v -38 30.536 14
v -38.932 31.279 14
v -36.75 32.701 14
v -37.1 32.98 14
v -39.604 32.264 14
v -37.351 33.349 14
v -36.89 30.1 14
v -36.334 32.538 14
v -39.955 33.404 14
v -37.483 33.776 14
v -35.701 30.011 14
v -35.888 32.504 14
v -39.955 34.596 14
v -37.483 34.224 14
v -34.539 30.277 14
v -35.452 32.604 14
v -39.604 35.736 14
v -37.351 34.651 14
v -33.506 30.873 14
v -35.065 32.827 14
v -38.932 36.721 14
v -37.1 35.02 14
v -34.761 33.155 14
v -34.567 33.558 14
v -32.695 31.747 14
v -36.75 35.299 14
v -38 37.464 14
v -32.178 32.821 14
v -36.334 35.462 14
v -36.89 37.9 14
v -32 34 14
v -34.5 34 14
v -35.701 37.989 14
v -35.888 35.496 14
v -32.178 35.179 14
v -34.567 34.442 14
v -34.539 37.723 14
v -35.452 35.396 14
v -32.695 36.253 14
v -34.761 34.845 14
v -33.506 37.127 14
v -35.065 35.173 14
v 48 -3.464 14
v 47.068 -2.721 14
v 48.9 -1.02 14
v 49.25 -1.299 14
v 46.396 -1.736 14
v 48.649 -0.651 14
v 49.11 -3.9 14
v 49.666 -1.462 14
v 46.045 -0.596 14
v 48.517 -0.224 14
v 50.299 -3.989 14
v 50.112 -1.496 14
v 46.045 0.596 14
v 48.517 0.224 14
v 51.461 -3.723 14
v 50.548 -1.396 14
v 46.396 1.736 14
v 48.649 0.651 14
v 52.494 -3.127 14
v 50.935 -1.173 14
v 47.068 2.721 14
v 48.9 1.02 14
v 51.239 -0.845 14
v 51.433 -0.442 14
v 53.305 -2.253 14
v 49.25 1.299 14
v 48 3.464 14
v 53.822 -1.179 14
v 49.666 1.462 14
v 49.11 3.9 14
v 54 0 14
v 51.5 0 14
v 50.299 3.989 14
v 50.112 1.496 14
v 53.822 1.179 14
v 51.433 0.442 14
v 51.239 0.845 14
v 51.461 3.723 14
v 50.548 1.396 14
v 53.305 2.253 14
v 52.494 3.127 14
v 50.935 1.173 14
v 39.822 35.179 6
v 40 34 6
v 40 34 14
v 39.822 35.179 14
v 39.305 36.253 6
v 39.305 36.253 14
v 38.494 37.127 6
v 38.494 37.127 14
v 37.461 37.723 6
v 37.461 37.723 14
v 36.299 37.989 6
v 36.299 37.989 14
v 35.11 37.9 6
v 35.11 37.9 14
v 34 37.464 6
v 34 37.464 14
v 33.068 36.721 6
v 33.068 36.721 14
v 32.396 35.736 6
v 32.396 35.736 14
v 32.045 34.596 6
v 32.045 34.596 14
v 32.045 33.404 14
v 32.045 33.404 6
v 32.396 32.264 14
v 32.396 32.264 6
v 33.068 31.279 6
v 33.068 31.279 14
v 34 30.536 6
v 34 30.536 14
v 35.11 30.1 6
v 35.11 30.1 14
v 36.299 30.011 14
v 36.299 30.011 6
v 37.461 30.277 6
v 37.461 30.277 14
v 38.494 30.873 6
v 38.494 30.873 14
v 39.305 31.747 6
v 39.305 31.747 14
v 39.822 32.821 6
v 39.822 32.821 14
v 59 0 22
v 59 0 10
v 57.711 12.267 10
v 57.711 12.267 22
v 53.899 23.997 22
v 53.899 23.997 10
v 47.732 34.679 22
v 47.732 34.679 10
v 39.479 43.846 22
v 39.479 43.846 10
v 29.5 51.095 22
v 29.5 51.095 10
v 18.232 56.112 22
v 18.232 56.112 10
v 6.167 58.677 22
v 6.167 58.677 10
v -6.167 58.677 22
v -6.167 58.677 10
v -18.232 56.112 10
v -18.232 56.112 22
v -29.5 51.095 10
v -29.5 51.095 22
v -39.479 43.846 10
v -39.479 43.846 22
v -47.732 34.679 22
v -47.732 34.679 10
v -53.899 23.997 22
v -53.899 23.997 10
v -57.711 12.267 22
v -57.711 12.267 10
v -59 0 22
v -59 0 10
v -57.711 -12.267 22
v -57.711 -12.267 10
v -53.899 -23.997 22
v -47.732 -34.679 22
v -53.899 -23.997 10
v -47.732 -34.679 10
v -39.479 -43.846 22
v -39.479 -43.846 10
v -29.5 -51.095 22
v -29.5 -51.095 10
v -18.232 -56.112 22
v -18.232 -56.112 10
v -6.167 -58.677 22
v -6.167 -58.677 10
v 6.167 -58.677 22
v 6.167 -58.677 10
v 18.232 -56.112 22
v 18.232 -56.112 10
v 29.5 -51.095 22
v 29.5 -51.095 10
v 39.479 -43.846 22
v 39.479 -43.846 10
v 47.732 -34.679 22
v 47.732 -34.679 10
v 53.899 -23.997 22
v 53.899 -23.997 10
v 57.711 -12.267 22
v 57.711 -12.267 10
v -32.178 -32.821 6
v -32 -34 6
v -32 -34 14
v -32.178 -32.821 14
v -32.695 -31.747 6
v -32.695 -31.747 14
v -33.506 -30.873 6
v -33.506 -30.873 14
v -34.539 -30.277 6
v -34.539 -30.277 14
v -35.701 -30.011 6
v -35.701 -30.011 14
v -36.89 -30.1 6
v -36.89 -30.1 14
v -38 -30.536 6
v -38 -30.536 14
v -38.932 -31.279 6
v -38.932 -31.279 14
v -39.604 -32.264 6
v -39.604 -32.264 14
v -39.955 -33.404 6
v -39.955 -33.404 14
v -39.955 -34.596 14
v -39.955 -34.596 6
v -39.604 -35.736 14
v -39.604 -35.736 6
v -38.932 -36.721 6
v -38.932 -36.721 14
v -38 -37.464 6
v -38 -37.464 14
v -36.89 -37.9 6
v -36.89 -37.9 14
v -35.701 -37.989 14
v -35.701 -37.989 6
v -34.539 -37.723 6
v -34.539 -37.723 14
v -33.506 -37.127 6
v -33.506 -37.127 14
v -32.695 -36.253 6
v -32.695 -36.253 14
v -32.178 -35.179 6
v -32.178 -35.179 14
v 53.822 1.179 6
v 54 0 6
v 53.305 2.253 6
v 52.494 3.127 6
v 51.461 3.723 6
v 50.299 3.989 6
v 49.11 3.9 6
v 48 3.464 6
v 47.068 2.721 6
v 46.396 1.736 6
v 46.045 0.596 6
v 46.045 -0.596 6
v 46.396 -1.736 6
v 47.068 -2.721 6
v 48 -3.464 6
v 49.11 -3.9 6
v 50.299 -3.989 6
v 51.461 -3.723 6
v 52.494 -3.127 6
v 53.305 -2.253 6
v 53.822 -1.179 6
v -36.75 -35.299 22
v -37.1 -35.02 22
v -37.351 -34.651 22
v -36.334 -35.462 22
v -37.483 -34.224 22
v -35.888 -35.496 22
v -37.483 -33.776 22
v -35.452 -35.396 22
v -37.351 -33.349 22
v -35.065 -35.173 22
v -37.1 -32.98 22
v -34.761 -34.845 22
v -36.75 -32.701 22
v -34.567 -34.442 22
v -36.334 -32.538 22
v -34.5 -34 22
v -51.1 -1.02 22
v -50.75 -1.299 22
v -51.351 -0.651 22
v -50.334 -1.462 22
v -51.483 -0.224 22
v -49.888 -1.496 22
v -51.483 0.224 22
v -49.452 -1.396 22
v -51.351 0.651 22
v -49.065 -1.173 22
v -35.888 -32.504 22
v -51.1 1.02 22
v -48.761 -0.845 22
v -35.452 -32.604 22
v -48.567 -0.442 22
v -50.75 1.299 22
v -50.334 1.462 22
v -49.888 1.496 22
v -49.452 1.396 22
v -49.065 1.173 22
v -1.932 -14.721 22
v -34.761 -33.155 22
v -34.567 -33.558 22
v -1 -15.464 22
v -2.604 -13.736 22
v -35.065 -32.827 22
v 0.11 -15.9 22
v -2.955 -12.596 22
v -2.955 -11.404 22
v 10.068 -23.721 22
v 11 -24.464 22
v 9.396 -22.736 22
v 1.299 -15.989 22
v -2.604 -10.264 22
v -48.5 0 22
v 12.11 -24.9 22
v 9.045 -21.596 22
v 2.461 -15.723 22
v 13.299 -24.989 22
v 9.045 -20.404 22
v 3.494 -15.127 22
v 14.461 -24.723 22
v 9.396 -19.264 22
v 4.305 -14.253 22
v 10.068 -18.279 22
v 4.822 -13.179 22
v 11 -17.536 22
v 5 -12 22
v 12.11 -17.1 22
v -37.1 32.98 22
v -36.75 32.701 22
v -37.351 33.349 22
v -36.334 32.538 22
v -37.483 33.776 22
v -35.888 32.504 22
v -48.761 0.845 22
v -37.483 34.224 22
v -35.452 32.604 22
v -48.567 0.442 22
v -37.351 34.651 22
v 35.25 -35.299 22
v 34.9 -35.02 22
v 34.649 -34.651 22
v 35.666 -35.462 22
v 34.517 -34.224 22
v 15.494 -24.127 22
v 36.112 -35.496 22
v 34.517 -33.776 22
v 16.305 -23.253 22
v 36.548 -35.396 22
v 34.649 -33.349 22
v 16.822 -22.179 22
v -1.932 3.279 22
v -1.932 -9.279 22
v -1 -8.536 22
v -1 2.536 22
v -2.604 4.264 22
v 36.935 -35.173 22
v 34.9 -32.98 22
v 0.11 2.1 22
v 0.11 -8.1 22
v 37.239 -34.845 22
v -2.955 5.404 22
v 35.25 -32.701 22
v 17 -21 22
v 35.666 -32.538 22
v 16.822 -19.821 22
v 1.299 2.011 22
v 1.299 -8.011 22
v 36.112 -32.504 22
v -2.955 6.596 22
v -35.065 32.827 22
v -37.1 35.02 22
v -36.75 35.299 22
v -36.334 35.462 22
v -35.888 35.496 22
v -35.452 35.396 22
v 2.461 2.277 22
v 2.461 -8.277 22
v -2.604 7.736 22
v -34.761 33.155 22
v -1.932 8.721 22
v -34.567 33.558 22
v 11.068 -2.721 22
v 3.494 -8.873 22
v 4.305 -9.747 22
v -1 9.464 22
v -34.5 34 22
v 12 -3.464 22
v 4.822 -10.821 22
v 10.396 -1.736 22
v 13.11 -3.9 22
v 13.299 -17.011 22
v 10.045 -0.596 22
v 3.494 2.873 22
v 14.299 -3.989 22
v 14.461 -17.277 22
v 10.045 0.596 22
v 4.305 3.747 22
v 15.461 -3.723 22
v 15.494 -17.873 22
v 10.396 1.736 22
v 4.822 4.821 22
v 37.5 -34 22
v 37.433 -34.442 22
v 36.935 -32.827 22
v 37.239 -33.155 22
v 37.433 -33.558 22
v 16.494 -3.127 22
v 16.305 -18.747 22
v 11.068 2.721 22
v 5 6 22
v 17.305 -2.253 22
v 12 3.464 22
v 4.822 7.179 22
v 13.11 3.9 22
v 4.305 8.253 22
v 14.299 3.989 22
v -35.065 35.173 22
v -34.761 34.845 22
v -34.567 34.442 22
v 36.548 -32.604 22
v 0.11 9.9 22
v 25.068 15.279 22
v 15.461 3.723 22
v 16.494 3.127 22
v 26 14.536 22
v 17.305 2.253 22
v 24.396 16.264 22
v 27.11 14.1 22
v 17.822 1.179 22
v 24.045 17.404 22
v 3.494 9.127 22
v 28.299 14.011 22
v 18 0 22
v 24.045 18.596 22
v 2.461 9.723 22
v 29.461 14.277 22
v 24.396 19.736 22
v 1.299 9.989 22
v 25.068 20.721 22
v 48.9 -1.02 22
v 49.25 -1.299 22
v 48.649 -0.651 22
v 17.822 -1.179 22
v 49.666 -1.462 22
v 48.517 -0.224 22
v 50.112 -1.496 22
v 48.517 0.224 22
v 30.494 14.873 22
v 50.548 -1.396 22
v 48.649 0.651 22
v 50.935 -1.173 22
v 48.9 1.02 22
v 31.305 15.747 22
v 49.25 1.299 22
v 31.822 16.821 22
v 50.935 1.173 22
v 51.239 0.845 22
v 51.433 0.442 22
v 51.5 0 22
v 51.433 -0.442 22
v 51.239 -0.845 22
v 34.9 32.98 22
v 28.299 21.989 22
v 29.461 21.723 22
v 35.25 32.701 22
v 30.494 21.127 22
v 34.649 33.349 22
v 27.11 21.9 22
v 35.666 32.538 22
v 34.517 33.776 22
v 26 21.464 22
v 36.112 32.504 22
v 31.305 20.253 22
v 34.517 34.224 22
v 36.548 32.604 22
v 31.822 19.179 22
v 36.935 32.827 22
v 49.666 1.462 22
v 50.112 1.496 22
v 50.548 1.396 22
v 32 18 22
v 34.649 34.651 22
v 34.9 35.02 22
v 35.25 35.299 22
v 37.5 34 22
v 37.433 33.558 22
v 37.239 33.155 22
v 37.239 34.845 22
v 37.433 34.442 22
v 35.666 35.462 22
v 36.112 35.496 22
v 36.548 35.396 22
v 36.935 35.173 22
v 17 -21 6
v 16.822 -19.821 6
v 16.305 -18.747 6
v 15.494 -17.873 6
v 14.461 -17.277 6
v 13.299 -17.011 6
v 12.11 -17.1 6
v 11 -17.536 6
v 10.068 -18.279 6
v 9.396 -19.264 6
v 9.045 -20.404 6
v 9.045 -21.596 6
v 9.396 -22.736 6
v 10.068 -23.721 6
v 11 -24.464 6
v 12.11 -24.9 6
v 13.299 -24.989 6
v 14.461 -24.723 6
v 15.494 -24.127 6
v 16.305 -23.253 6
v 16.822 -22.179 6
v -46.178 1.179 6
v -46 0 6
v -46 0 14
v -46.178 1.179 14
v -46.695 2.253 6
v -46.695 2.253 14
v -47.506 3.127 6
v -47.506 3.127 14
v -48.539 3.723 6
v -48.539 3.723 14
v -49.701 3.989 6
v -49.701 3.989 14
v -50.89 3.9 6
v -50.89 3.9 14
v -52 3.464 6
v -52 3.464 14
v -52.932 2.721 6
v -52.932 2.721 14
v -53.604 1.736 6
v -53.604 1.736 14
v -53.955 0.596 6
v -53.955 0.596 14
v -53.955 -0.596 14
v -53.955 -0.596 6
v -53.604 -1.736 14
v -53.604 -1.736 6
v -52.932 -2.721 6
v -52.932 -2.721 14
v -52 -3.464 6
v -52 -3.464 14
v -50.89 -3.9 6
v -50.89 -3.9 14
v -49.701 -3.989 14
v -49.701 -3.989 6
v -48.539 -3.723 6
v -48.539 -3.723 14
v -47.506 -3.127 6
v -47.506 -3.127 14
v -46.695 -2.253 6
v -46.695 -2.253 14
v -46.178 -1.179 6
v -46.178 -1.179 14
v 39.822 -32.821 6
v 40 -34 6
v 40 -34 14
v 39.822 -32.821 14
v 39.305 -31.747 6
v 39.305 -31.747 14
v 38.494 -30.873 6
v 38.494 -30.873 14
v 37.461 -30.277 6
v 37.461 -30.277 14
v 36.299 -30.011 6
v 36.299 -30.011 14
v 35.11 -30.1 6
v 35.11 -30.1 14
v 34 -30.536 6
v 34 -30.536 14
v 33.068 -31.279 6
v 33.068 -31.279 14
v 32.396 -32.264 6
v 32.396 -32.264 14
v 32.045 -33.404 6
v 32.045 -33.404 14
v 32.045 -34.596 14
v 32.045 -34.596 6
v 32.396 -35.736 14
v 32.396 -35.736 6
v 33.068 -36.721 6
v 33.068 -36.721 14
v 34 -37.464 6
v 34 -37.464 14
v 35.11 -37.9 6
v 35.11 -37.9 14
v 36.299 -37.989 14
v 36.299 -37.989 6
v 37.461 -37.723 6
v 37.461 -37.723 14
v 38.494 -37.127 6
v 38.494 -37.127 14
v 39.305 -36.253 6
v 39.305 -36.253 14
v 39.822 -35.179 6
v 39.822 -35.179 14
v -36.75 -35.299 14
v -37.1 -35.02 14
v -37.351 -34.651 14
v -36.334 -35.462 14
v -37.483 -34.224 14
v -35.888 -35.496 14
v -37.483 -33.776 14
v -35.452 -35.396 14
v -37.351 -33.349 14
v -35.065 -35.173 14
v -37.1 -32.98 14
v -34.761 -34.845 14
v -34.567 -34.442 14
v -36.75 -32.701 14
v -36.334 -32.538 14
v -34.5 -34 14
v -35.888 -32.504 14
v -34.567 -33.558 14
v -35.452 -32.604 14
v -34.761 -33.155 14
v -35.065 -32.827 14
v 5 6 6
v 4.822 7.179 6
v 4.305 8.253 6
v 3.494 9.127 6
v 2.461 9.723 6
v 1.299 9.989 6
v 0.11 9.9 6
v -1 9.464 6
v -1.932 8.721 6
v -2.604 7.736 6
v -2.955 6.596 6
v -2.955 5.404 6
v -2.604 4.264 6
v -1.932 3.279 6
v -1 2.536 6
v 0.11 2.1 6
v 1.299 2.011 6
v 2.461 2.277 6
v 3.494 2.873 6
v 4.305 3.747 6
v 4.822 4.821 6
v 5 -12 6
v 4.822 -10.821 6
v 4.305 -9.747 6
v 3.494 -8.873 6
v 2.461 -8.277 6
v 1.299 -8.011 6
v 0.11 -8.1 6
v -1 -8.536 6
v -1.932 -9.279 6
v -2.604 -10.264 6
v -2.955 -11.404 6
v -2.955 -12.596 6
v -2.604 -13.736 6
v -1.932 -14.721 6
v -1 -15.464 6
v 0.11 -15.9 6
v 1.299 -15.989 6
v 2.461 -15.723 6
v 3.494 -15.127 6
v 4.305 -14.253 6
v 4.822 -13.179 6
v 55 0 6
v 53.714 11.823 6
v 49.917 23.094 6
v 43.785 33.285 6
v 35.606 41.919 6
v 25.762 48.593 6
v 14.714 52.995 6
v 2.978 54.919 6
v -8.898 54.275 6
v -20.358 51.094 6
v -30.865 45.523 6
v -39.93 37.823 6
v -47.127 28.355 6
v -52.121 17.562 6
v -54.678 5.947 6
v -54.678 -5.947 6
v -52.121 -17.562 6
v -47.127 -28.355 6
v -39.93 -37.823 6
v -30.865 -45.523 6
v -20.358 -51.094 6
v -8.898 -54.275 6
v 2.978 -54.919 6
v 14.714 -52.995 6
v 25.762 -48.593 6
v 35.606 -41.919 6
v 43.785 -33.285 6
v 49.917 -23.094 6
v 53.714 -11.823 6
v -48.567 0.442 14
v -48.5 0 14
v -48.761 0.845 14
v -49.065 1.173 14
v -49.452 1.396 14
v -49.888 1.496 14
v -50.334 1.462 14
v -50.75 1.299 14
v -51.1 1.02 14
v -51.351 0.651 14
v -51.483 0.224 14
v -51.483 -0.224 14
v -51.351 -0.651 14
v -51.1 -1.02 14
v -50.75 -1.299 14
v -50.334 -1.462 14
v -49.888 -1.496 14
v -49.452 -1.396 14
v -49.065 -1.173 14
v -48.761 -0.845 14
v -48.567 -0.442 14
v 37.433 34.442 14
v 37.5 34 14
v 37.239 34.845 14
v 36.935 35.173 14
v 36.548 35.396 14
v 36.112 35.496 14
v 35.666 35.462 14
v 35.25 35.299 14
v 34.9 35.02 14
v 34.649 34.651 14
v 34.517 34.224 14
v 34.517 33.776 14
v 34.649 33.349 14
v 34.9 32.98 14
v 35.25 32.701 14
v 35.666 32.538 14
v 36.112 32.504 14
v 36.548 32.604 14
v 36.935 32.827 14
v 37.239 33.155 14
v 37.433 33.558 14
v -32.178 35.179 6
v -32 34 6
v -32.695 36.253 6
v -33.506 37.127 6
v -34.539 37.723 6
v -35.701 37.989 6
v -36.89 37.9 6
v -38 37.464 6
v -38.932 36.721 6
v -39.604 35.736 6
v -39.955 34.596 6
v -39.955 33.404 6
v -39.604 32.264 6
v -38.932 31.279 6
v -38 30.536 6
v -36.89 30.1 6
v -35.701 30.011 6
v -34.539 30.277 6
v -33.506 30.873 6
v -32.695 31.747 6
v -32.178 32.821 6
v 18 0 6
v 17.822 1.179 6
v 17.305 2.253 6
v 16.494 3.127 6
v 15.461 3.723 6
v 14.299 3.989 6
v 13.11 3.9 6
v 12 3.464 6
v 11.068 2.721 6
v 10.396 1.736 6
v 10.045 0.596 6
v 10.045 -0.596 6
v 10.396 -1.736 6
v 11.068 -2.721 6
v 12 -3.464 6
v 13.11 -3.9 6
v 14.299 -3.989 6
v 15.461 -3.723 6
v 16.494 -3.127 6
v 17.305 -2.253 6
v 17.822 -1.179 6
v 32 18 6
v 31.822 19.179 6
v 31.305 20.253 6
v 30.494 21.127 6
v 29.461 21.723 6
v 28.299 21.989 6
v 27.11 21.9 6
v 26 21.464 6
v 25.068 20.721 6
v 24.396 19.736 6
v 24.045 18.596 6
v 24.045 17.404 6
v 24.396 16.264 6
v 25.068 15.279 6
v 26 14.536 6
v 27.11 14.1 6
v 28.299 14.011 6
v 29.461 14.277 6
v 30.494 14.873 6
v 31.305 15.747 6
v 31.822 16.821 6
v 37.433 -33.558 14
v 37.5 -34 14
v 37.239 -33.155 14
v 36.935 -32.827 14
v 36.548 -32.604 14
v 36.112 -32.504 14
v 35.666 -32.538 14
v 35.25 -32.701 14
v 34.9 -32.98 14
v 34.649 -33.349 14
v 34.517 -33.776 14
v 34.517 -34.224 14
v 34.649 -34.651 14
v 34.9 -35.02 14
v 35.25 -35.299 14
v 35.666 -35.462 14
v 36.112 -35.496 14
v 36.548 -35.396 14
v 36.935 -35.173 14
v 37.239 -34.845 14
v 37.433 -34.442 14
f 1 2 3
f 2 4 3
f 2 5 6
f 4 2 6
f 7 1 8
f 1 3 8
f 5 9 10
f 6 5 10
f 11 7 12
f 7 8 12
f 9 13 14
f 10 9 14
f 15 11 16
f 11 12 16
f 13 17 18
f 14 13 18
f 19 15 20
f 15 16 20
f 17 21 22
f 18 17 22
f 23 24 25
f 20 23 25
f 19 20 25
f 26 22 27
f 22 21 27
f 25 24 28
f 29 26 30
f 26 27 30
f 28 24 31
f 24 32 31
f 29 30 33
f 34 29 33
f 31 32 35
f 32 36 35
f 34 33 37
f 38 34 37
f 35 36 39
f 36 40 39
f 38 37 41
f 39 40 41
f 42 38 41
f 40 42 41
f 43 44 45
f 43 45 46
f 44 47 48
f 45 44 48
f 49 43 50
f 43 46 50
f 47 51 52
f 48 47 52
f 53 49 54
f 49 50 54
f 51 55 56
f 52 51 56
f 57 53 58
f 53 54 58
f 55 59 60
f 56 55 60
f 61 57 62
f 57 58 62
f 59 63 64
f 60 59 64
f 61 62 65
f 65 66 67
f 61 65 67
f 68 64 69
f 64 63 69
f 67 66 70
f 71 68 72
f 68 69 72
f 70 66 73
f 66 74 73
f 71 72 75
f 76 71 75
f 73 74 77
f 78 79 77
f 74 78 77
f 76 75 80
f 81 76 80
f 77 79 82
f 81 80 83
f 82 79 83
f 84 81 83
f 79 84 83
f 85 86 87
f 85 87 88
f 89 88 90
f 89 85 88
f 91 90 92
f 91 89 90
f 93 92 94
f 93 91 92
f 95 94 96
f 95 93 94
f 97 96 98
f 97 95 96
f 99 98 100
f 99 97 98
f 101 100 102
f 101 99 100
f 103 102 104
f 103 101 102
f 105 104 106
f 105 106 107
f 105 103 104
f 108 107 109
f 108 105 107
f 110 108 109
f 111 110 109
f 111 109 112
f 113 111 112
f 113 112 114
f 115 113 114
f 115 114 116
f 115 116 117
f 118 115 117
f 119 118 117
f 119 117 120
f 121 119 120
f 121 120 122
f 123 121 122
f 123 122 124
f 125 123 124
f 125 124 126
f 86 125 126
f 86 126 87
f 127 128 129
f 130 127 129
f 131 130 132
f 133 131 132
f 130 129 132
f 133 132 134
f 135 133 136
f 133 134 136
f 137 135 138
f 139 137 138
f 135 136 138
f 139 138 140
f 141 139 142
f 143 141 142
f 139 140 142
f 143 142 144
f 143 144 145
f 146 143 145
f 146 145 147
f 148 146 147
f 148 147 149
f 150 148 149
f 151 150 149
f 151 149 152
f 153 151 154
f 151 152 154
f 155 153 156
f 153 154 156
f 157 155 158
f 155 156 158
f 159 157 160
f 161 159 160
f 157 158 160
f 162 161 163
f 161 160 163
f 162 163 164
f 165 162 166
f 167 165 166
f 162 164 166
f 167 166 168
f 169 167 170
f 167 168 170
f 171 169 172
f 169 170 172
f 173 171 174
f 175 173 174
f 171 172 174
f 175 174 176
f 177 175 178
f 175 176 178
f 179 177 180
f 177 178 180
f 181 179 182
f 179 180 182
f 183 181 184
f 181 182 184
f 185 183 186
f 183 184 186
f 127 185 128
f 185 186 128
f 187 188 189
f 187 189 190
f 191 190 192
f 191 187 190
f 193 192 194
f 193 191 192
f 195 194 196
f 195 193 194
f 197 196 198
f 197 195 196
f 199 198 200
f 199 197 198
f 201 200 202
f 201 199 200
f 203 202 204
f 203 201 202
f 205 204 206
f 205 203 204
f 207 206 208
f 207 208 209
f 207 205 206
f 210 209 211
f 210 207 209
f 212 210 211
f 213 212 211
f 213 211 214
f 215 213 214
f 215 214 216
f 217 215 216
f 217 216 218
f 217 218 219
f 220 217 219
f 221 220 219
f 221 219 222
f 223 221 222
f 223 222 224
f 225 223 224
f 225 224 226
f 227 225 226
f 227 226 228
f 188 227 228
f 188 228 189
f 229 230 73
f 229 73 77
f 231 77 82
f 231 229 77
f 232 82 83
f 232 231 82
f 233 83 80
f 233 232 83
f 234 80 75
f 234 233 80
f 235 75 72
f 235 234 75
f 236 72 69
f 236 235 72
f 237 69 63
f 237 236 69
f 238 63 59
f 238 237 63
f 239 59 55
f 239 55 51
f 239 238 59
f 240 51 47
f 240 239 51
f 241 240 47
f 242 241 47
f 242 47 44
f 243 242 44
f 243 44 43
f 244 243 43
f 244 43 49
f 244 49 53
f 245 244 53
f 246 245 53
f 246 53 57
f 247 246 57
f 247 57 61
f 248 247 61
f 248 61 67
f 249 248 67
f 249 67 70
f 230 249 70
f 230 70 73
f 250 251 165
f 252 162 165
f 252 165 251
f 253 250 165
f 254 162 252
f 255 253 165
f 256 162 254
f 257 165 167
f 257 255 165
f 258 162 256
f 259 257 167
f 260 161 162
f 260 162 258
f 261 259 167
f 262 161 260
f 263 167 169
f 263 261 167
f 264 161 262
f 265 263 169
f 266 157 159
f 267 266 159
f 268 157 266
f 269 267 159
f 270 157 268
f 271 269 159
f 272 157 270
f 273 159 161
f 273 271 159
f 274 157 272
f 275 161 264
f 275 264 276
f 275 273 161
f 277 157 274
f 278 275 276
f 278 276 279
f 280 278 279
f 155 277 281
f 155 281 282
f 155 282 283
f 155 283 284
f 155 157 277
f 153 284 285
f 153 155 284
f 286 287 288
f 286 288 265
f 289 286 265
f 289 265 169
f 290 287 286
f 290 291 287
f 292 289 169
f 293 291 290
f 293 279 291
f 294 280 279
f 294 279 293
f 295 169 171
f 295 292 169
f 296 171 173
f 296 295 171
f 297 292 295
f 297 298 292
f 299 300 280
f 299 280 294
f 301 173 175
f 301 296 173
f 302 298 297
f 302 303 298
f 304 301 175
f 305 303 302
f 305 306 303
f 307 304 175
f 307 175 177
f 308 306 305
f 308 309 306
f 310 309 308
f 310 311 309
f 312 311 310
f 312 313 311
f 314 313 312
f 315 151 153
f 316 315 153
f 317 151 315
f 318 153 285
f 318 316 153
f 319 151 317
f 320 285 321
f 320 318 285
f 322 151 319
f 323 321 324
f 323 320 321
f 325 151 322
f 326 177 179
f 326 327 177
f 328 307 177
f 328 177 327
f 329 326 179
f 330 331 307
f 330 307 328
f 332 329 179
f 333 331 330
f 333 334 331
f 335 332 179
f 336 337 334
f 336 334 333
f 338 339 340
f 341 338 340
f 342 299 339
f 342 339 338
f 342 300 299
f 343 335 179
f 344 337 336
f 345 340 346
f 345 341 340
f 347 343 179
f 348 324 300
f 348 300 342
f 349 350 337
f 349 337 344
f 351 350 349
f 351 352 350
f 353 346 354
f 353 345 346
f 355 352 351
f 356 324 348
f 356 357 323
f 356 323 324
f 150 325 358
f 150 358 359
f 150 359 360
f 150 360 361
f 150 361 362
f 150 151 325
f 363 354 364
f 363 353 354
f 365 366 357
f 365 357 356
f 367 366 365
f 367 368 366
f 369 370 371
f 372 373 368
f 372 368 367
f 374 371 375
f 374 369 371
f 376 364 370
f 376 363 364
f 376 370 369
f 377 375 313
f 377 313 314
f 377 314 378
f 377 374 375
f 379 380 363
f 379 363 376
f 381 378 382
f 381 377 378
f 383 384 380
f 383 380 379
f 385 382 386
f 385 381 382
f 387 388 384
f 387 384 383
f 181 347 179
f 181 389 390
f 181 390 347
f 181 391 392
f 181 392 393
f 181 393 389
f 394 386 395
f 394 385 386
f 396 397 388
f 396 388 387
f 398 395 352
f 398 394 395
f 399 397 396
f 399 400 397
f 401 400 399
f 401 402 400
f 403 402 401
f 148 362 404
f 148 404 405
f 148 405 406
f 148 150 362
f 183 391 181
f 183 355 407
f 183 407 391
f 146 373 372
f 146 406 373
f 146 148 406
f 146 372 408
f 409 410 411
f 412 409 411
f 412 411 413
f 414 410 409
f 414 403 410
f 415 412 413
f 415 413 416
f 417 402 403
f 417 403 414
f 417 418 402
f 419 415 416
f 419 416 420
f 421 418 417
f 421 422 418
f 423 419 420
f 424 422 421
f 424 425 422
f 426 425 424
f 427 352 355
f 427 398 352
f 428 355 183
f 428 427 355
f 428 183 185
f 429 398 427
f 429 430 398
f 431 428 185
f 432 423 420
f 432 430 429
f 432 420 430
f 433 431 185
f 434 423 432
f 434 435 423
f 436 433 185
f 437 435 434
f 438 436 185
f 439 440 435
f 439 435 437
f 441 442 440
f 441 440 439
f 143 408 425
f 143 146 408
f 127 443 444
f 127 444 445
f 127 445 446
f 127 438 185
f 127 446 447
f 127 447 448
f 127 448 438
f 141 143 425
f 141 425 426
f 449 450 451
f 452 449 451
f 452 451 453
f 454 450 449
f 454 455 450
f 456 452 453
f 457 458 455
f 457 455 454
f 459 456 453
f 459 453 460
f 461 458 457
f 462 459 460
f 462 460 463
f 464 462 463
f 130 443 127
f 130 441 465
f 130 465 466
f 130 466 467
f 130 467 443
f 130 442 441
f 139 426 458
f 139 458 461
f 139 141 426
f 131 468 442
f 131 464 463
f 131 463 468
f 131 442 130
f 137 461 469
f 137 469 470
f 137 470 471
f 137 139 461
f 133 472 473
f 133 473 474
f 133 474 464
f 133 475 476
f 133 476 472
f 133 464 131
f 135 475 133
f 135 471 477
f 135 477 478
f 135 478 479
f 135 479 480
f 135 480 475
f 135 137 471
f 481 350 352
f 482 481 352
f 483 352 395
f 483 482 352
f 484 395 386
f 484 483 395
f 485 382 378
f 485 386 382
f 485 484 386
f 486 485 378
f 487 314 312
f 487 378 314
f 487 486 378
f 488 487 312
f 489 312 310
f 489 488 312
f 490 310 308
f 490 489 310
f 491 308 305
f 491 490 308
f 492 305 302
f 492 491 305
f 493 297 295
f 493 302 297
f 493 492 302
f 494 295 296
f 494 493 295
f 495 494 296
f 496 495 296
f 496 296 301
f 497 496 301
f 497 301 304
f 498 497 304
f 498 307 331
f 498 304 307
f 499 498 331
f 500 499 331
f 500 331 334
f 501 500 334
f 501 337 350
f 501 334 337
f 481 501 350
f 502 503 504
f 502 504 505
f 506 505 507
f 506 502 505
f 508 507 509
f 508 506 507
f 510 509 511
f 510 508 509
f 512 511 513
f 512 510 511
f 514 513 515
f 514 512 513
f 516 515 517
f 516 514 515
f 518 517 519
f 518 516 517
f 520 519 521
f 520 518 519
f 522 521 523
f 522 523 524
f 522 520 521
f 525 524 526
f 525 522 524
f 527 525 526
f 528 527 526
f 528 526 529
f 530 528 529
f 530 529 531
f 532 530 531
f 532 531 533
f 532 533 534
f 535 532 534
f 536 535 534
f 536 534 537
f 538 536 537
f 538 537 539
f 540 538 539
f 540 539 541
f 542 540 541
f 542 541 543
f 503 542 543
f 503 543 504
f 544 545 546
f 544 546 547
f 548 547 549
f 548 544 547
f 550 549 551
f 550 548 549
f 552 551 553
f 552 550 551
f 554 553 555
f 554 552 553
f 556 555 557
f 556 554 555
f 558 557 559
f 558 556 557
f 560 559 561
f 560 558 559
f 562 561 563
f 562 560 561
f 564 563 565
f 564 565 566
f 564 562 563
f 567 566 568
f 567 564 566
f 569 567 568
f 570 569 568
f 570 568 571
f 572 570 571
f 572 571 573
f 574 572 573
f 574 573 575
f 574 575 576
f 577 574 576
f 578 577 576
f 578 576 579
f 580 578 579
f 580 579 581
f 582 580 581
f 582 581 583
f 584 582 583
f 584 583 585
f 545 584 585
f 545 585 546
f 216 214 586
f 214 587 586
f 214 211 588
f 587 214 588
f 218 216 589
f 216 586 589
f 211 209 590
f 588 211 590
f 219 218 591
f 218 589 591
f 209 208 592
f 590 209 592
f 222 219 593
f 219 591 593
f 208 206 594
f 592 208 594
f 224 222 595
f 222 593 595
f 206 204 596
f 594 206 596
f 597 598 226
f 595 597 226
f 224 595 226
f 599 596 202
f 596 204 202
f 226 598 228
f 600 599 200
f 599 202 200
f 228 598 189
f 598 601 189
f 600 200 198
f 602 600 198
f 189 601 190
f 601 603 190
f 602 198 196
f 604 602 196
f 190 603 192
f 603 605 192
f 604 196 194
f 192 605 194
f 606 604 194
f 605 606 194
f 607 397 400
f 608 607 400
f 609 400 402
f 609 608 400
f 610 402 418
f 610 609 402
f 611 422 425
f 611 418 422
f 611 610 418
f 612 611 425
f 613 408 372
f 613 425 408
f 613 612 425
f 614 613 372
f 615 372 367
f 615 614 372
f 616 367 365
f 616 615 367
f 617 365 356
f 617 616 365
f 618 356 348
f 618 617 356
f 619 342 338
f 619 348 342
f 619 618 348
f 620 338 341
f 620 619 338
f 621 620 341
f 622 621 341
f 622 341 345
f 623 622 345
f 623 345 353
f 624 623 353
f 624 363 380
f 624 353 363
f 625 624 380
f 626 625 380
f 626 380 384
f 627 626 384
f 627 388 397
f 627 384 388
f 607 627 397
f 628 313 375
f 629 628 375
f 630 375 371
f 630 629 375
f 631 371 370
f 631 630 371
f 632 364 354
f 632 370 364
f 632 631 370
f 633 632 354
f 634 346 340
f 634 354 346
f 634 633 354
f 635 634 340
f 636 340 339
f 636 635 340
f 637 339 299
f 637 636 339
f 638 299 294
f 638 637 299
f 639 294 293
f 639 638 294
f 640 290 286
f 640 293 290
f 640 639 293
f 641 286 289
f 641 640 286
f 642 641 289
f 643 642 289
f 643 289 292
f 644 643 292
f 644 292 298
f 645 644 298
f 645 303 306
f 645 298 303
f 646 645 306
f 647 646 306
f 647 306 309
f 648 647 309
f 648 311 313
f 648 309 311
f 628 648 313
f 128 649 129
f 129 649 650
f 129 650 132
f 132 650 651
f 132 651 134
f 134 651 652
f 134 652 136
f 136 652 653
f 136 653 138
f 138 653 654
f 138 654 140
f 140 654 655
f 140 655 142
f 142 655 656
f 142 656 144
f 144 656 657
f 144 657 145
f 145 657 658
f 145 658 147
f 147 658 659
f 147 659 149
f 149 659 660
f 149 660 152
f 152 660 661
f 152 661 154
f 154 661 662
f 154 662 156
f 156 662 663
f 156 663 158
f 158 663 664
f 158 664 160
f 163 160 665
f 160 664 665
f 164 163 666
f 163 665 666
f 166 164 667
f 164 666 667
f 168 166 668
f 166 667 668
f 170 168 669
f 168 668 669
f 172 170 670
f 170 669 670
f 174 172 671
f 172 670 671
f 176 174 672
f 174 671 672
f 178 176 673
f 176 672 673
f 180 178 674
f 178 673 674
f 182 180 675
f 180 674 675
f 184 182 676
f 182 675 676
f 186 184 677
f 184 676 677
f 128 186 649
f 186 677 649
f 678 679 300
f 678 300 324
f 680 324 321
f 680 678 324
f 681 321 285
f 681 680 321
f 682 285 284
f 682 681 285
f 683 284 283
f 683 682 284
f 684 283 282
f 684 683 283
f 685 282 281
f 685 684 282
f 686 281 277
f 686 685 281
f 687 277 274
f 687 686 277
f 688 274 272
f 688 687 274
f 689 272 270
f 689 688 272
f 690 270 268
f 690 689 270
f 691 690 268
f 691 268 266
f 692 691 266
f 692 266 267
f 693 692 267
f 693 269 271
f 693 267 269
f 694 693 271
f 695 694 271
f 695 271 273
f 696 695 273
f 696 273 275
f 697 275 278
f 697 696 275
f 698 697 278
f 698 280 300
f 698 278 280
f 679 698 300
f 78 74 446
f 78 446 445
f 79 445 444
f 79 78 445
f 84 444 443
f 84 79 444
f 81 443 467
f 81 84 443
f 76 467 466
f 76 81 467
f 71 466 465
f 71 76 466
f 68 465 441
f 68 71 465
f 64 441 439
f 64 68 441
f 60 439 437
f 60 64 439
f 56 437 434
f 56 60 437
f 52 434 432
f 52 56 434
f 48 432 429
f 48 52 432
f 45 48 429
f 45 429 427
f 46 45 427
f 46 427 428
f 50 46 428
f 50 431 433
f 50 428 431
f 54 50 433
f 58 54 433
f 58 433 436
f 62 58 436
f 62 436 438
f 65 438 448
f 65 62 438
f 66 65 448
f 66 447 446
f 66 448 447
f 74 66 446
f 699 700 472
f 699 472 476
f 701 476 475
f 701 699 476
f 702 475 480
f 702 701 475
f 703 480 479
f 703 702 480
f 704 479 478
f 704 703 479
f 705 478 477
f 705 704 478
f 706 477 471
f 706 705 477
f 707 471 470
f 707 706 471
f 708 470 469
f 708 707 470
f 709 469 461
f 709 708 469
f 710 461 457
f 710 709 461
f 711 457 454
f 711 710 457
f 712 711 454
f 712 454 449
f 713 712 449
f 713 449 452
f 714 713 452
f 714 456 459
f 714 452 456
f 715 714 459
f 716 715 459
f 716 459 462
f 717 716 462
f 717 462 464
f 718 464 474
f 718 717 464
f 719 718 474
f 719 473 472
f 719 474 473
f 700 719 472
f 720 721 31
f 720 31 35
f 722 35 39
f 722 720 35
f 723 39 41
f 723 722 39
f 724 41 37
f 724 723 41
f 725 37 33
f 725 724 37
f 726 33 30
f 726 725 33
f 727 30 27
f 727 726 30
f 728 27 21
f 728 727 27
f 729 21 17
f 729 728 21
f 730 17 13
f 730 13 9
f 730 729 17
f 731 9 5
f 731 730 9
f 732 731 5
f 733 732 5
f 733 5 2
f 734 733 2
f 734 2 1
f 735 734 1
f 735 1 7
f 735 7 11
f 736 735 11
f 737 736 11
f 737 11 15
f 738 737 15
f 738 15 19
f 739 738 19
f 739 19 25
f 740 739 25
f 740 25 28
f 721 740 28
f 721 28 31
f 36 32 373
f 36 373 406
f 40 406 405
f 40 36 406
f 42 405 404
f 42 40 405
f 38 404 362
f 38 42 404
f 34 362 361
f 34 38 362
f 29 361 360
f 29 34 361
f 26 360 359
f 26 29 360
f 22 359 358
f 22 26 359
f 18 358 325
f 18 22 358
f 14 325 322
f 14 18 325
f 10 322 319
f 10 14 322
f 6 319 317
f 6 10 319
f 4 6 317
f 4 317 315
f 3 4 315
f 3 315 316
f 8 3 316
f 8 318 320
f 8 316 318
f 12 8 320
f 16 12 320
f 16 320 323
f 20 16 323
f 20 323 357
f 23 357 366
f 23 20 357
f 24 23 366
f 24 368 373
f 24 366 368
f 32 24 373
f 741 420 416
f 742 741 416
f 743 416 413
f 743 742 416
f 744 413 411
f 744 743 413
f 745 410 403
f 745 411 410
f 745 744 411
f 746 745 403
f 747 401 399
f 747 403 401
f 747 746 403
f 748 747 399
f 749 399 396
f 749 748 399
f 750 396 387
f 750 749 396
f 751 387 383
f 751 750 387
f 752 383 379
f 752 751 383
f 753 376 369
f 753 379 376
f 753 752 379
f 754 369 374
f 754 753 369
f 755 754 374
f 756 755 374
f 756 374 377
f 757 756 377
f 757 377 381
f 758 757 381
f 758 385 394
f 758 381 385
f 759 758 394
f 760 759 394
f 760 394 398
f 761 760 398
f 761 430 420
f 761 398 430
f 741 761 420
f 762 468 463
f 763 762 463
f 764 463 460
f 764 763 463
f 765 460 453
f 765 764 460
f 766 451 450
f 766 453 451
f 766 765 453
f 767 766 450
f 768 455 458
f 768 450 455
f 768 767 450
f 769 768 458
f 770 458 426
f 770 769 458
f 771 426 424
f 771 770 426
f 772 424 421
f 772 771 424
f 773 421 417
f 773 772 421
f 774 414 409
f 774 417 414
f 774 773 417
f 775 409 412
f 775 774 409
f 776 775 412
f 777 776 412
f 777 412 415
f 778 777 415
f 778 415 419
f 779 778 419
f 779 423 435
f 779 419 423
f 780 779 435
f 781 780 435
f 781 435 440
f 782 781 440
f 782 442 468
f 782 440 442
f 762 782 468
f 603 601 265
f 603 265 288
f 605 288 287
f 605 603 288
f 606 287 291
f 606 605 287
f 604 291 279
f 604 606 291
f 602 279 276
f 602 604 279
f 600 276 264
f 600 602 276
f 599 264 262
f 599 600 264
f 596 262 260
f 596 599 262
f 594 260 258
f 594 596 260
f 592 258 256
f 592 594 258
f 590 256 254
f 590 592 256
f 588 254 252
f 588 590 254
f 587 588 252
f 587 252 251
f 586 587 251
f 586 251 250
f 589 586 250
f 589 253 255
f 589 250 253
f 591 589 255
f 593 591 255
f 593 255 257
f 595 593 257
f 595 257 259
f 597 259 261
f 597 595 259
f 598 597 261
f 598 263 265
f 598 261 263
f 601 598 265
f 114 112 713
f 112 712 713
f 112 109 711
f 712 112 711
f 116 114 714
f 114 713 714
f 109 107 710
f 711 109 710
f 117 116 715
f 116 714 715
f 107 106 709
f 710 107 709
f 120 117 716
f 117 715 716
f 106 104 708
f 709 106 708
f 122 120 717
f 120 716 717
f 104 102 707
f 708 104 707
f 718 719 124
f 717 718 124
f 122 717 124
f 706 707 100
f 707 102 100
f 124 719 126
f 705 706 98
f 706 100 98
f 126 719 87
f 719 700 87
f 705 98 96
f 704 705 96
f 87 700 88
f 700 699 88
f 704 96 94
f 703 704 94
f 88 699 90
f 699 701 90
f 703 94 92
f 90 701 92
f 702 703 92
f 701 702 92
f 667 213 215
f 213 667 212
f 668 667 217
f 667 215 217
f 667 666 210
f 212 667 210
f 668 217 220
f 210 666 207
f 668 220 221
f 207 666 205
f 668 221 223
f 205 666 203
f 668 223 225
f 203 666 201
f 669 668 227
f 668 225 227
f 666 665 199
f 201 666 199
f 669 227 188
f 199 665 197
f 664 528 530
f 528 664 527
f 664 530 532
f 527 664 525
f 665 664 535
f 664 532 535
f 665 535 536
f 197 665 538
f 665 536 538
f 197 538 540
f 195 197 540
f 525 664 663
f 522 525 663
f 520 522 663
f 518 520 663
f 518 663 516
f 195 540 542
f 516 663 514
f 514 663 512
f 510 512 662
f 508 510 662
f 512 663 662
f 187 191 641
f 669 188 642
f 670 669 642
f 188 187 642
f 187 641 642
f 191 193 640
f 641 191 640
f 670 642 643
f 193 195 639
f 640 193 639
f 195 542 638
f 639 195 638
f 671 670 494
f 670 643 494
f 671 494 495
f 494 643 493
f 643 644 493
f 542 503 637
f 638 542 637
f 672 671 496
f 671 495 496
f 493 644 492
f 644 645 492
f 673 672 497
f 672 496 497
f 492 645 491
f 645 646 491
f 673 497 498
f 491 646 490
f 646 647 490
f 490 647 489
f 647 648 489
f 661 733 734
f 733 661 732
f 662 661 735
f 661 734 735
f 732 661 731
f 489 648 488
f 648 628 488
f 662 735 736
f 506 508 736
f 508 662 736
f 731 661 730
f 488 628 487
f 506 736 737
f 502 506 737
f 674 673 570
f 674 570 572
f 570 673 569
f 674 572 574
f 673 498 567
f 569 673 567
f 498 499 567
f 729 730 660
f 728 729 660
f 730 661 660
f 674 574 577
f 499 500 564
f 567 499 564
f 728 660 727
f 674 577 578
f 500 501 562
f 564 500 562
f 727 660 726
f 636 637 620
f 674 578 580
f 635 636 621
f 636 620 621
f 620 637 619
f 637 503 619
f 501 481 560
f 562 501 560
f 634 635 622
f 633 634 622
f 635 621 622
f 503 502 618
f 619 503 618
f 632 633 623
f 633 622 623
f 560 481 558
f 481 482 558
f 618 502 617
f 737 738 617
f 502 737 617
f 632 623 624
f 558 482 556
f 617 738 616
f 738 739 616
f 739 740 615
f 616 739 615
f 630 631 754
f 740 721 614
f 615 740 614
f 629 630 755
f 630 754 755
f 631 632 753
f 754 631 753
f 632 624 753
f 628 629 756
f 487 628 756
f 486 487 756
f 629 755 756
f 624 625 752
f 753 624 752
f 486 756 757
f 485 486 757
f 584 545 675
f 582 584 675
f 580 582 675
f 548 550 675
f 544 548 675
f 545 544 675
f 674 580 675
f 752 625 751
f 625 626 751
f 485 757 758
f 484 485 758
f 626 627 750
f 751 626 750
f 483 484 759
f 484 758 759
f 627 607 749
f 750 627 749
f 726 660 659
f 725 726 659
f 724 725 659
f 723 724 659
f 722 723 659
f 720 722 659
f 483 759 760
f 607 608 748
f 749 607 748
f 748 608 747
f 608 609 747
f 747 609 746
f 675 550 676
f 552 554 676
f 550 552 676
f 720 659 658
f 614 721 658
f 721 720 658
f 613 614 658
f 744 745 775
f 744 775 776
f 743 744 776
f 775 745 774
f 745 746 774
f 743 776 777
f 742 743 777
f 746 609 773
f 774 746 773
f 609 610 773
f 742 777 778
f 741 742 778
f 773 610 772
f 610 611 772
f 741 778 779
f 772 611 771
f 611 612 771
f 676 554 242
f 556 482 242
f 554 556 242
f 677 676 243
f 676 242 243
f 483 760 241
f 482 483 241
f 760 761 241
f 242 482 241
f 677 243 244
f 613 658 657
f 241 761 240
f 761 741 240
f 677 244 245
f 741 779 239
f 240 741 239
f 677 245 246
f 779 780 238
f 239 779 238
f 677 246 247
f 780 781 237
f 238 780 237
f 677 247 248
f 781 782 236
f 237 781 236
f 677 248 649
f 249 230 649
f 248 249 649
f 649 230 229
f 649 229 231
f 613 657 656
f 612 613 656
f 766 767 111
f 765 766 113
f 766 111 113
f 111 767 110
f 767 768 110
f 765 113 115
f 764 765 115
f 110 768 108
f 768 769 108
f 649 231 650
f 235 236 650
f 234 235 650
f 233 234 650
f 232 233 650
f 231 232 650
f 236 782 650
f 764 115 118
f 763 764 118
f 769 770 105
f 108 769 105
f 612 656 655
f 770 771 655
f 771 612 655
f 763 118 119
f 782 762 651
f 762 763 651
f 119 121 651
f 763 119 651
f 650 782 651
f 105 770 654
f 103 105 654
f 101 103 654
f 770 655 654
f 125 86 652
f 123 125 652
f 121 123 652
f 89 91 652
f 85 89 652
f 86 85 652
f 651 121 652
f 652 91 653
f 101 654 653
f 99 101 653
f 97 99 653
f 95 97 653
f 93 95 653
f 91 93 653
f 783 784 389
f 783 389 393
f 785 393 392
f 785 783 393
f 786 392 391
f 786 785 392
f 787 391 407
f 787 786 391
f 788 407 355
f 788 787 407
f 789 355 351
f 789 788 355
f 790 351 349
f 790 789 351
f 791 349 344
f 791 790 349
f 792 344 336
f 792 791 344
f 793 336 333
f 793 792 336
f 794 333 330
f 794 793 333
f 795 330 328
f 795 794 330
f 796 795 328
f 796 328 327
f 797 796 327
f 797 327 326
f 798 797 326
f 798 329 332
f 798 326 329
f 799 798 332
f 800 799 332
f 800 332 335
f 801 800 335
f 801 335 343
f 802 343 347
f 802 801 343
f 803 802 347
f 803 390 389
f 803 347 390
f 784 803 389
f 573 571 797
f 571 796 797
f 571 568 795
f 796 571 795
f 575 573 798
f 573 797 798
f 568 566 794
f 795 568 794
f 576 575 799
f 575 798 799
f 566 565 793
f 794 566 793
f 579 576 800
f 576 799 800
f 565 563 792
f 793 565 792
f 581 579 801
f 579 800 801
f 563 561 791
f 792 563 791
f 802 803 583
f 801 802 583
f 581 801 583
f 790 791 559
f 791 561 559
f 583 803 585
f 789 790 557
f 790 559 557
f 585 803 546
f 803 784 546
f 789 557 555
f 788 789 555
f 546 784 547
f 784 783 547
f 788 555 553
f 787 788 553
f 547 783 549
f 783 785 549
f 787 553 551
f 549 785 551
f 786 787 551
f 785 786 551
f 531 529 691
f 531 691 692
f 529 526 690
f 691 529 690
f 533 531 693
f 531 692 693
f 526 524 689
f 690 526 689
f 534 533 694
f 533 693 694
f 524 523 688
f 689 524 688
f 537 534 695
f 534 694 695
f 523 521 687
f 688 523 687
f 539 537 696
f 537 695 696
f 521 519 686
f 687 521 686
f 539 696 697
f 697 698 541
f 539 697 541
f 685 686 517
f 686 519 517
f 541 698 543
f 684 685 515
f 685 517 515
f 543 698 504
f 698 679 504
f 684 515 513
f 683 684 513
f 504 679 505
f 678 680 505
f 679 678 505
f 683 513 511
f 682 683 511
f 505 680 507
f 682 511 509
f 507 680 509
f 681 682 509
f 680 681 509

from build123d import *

# Parameters (mm, degrees)
CYLINDER1536_R     = 4
CYLINDER1536_DEPTH = 100
CYLINDER1535_R     = 4
CYLINDER1535_DEPTH = 100
CYLINDER1484_R     = 1.5
CYLINDER1484_DEPTH = 100
CYLINDER1485_R     = 1.5
CYLINDER1485_DEPTH = 100
CYLINDER1486_R     = 1.5
CYLINDER1486_DEPTH = 100
CYLINDER1487_R     = 1.5
CYLINDER1487_DEPTH = 100
CYLINDER1488_R     = 1.5
CYLINDER1488_DEPTH = 100
CYLINDER1483_R     = 1.5
CYLINDER1483_DEPTH = 100
CYLINDER1133_R     = 4
CYLINDER1133_DEPTH = 100
CYLINDER1134_R     = 4
CYLINDER1134_DEPTH = 100
CYLINDER1135_R     = 4
CYLINDER1135_DEPTH = 100
CYLINDER1131_R     = 4
CYLINDER1131_DEPTH = 100
CYLINDER1136_R     = 4
CYLINDER1136_DEPTH = 100
CYLINDER1132_R     = 4
CYLINDER1132_DEPTH = 100
CYLINDER1508_R     = 4
CYLINDER1508_DEPTH = 20
CYLINDER1509_R     = 4
CYLINDER1509_DEPTH = 20
CYLINDER1510_R     = 4
CYLINDER1510_DEPTH = 20
CYLINDER1511_R     = 4
CYLINDER1511_DEPTH = 40
CYLINDER1512_R     = 4
CYLINDER1512_DEPTH = 40
CYLINDER1513_R     = 4
CYLINDER1513_DEPTH = 40
CYLINDER1514_R     = 4
CYLINDER1514_DEPTH = 40
CYLINDER1507_R     = 4
CYLINDER1507_DEPTH = 20
CYLINDER1489_R     = 59
CYLINDER1489_DEPTH = 16
CHAMFER040_SIZE    = 4


with BuildPart() as v_lec1536:
    # Cylinder1536 → Cylinder1536 (new body)
    with BuildSketch(Plane(origin=(14, 0, -18), x_dir=(1, 0, 0), z_dir=(0, 0, 1))):
        Circle(CYLINDER1536_R)
    extrude(amount=CYLINDER1536_DEPTH)


with BuildPart() as srouby_troj_silne005:
    # Cylinder1535 → Cylinder1535 (new body)
    with BuildSketch(Plane(origin=(90, 0, -18), x_dir=(1, 0, 0), z_dir=(0, 0, 1))):
        Circle(CYLINDER1535_R)
    extrude(amount=CYLINDER1535_DEPTH)

    # Compound905: union Válec1536
    add(v_lec1536.part)


with BuildPart() as v_lec1484:
    # Cylinder1484 → Cylinder1484 (new body)
    with BuildSketch(Plane(origin=(-36, 34, -60), x_dir=(1, 0, 0), z_dir=(0, 0, 1))):
        Circle(CYLINDER1484_R)
    extrude(amount=CYLINDER1484_DEPTH)


with BuildPart() as v_lec1485:
    # Cylinder1485 → Cylinder1485 (new body)
    with BuildSketch(Plane(origin=(-36, -34, -60), x_dir=(1, 0, 0), z_dir=(0, 0, 1))):
        Circle(CYLINDER1485_R)
    extrude(amount=CYLINDER1485_DEPTH)


with BuildPart() as v_lec1486:
    # Cylinder1486 → Cylinder1486 (new body)
    with BuildSketch(Plane(origin=(50, 0, -60), x_dir=(1, 0, 0), z_dir=(0, 0, 1))):
        Circle(CYLINDER1486_R)
    extrude(amount=CYLINDER1486_DEPTH)


with BuildPart() as v_lec1487:
    # Cylinder1487 → Cylinder1487 (new body)
    with BuildSketch(Plane(origin=(36, 34, -60), x_dir=(1, 0, 0), z_dir=(0, 0, 1))):
        Circle(CYLINDER1487_R)
    extrude(amount=CYLINDER1487_DEPTH)


with BuildPart() as v_lec1488:
    # Cylinder1488 → Cylinder1488 (new body)
    with BuildSketch(Plane(origin=(36, -34, -60), x_dir=(1, 0, 0), z_dir=(0, 0, 1))):
        Circle(CYLINDER1488_R)
    extrude(amount=CYLINDER1488_DEPTH)


with BuildPart() as sbouby_baze004:
    # Cylinder1483 → Cylinder1483 (new body)
    with BuildSketch(Plane(origin=(-50, 0, -60), x_dir=(1, 0, 0), z_dir=(0, 0, 1))):
        Circle(CYLINDER1483_R)
    extrude(amount=CYLINDER1483_DEPTH)

    # Compound892: union Válec1484, Válec1485, Válec1486, Válec1487, Válec1488
    add(v_lec1484.part)
    add(v_lec1485.part)
    add(v_lec1486.part)
    add(v_lec1487.part)
    add(v_lec1488.part)


with BuildPart() as v_lec1133:
    # Cylinder1133 → Cylinder1133 (new body)
    with BuildSketch(Plane(origin=(-36, 34, -90), x_dir=(1, 0, 0), z_dir=(0, 0, 1))):
        Circle(CYLINDER1133_R)
    extrude(amount=CYLINDER1133_DEPTH)


with BuildPart() as v_lec1134:
    # Cylinder1134 → Cylinder1134 (new body)
    with BuildSketch(Plane(origin=(-36, -34, -90), x_dir=(1, 0, 0), z_dir=(0, 0, 1))):
        Circle(CYLINDER1134_R)
    extrude(amount=CYLINDER1134_DEPTH)


with BuildPart() as v_lec1135:
    # Cylinder1135 → Cylinder1135 (new body)
    with BuildSketch(Plane(origin=(50, 0, -90), x_dir=(1, 0, 0), z_dir=(0, 0, 1))):
        Circle(CYLINDER1135_R)
    extrude(amount=CYLINDER1135_DEPTH)


with BuildPart() as v_lec1131:
    # Cylinder1131 → Cylinder1131 (new body)
    with BuildSketch(Plane(origin=(36, 34, -90), x_dir=(1, 0, 0), z_dir=(0, 0, 1))):
        Circle(CYLINDER1131_R)
    extrude(amount=CYLINDER1131_DEPTH)


with BuildPart() as v_lec1136:
    # Cylinder1136 → Cylinder1136 (new body)
    with BuildSketch(Plane(origin=(36, -34, -90), x_dir=(1, 0, 0), z_dir=(0, 0, 1))):
        Circle(CYLINDER1136_R)
    extrude(amount=CYLINDER1136_DEPTH)


with BuildPart() as sbouby_baze_silne007:
    # Cylinder1132 → Cylinder1132 (new body)
    with BuildSketch(Plane(origin=(-50, 0, -90), x_dir=(1, 0, 0), z_dir=(0, 0, 1))):
        Circle(CYLINDER1132_R)
    extrude(amount=CYLINDER1132_DEPTH)

    # Compound897: union Válec1133, Válec1134, Válec1135, Válec1131, Válec1136
    add(v_lec1133.part)
    add(v_lec1134.part)
    add(v_lec1135.part)
    add(v_lec1131.part)
    add(v_lec1136.part)


with BuildPart() as v_lec1508:
    # Cylinder1508 → Cylinder1508 (new body)
    with BuildSketch(Plane(origin=(103, 6, -20), x_dir=(1, 0, 0), z_dir=(0, 0, 1))):
        Circle(CYLINDER1508_R)
    extrude(amount=CYLINDER1508_DEPTH)


with BuildPart() as v_lec1509:
    # Cylinder1509 → Cylinder1509 (new body)
    with BuildSketch(Plane(origin=(76, 18, -18), x_dir=(1, 0, 0), z_dir=(0, 0, 1))):
        Circle(CYLINDER1509_R)
    extrude(amount=CYLINDER1509_DEPTH)


with BuildPart() as v_lec1510:
    # Cylinder1510 → Cylinder1510 (new body)
    with BuildSketch(Plane(origin=(91, -21, -18), x_dir=(1, 0, 0), z_dir=(0, 0, 1))):
        Circle(CYLINDER1510_R)
    extrude(amount=CYLINDER1510_DEPTH)


with BuildPart() as v_lec1511:
    # Cylinder1511 → Cylinder1511 (new body)
    with BuildSketch(Plane(origin=(13, -21, -18), x_dir=(1, 0, 0), z_dir=(0, 0, 1))):
        Circle(CYLINDER1511_R)
    extrude(amount=CYLINDER1511_DEPTH)


with BuildPart() as v_lec1512:
    # Cylinder1512 → Cylinder1512 (new body)
    with BuildSketch(Plane(origin=(28, 18, -18), x_dir=(1, 0, 0), z_dir=(0, 0, 1))):
        Circle(CYLINDER1512_R)
    extrude(amount=CYLINDER1512_DEPTH)


with BuildPart() as v_lec1513:
    # Cylinder1513 → Cylinder1513 (new body)
    with BuildSketch(Plane(origin=(1, -12, -18), x_dir=(1, 0, 0), z_dir=(0, 0, 1))):
        Circle(CYLINDER1513_R)
    extrude(amount=CYLINDER1513_DEPTH)


with BuildPart() as v_lec1514:
    # Cylinder1514 → Cylinder1514 (new body)
    with BuildSketch(Plane(origin=(1, 6, -18), x_dir=(1, 0, 0), z_dir=(0, 0, 1))):
        Circle(CYLINDER1514_R)
    extrude(amount=CYLINDER1514_DEPTH)


with BuildPart() as srouby_monoblok_silne006:
    # Cylinder1507 → Cylinder1507 (new body)
    with BuildSketch(Plane(origin=(103, -12, -20), x_dir=(1, 0, 0), z_dir=(0, 0, 1))):
        Circle(CYLINDER1507_R)
    extrude(amount=CYLINDER1507_DEPTH)

    # Compound895: union Válec1508, Válec1509, Válec1510, Válec1511, Válec1512, Válec1513, Válec1514
    add(v_lec1508.part)
    add(v_lec1509.part)
    add(v_lec1510.part)
    add(v_lec1511.part)
    add(v_lec1512.part)
    add(v_lec1513.part)
    add(v_lec1514.part)


with BuildPart() as cut529:
    # Cylinder1489 → Cylinder1489 (new body)
    with BuildSketch(Plane.XY.offset(2)):
        Circle(CYLINDER1489_R)
    extrude(amount=CYLINDER1489_DEPTH)

    # Cut512: cut srouby_monoblok_silne006
    add(srouby_monoblok_silne006.part, mode=Mode.SUBTRACT)

    # Cut516: cut sbouby_baze_silne007
    add(sbouby_baze_silne007.part, mode=Mode.SUBTRACT)

    # Cut518: cut sbouby_baze004
    add(sbouby_baze004.part, mode=Mode.SUBTRACT)

    # Chamfer040
    chamfer040_edges = [cut529.edges().sort_by_distance(p)[0] for p in [
        (-59, 0, 2),
    ]]
    chamfer(chamfer040_edges, length=CHAMFER040_SIZE)

    # Cut529: cut srouby_troj_silne005
    add(srouby_troj_silne005.part, mode=Mode.SUBTRACT)


with BuildPart() as cut529_1:
    # Cut529 placement: moved
    add(cut529.part.moved(Location((0, 0, 4))))


solid = cut529_1.part
